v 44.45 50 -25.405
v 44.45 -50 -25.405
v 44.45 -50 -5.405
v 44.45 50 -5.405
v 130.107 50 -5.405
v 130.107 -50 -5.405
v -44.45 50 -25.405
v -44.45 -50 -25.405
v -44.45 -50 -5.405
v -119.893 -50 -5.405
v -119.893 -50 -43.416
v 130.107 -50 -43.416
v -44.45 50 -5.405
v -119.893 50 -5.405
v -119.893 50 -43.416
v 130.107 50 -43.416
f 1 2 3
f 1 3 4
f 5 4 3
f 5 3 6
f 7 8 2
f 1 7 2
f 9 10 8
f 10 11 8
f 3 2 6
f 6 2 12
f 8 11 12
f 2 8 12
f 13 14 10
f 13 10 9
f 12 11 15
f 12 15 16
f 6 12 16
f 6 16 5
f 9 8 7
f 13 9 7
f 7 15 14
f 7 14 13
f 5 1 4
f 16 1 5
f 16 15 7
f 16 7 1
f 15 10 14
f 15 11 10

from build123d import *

# Parameters (mm, degrees)
F0_W     = 250
F0_H     = 18.0115271627
F1_DEPTH = 50
F2_W     = 75.4434949934
F2_H     = 100
F2_W_2   = 85.6565050066
F3_DEPTH = 20


with BuildPart() as f1:
    # F0 (on Front) → F1 (new body, symmetric)
    with BuildSketch(Plane.XZ):
        with Locations((5.1065050066, -34.4105418772)):
            Rectangle(F0_W, F0_H)
    extrude(amount=F1_DEPTH, both=True)

    # F2 (on face) → F3 (join)
    with BuildSketch(Plane.XY.offset(-25.4047782958)):
        with Locations((-82.1717474967, 0)):
            Rectangle(F2_W, F2_H)
        with Locations((87.2782525033, 0)):
            Rectangle(F2_W_2, F2_H)
    extrude(amount=F3_DEPTH)


solid = f1.part
